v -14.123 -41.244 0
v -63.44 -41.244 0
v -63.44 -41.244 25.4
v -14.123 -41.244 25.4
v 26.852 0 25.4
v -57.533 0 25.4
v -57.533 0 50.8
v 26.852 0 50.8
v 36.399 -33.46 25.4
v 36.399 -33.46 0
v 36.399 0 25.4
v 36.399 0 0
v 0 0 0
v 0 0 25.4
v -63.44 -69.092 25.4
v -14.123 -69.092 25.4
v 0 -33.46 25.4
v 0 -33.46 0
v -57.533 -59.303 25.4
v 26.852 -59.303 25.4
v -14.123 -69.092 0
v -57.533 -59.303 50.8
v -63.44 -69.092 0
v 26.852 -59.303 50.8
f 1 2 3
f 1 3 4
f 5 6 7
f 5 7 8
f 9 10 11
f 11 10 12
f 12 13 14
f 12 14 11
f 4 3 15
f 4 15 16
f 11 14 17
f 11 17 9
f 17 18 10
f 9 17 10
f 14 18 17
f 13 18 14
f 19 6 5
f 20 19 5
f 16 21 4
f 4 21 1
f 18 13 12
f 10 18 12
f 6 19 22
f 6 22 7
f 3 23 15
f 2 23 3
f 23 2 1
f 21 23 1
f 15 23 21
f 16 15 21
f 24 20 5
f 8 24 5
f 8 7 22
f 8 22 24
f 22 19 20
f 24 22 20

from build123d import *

# Parameters (mm, degrees)
F0_W     = 36.39913
F0_H     = 33.459801
F1_DEPTH = 25.4
F2_W     = 49.317076
F2_H     = 27.848236
F3_DEPTH = 25.4
F5_W     = 84.384808
F5_H     = 59.302814
F6_DEPTH = 25.4


with BuildPart() as f1:
    # F0 (on Top) → F1 (new body)
    with BuildSketch(Plane.XY):
        with Locations((18.199565, -16.7299)):
            Rectangle(F0_W, F0_H)
    extrude(amount=F1_DEPTH)


with BuildPart() as f3:
    # F2 (on Top) → F3 (new body)
    with BuildSketch(Plane.XY):
        with Locations((-38.781524, -55.167761)):
            Rectangle(F2_W, F2_H)
    extrude(amount=F3_DEPTH)


with BuildPart() as f6:
    # F5 (on offset) → F6 (new body)
    with BuildSketch(Plane.XY.offset(25.4)):
        with Locations((-15.340331, -29.651407)):
            Rectangle(F5_W, F5_H)
    extrude(amount=F6_DEPTH)


solid = Compound([f1.part, f3.part, f6.part])
